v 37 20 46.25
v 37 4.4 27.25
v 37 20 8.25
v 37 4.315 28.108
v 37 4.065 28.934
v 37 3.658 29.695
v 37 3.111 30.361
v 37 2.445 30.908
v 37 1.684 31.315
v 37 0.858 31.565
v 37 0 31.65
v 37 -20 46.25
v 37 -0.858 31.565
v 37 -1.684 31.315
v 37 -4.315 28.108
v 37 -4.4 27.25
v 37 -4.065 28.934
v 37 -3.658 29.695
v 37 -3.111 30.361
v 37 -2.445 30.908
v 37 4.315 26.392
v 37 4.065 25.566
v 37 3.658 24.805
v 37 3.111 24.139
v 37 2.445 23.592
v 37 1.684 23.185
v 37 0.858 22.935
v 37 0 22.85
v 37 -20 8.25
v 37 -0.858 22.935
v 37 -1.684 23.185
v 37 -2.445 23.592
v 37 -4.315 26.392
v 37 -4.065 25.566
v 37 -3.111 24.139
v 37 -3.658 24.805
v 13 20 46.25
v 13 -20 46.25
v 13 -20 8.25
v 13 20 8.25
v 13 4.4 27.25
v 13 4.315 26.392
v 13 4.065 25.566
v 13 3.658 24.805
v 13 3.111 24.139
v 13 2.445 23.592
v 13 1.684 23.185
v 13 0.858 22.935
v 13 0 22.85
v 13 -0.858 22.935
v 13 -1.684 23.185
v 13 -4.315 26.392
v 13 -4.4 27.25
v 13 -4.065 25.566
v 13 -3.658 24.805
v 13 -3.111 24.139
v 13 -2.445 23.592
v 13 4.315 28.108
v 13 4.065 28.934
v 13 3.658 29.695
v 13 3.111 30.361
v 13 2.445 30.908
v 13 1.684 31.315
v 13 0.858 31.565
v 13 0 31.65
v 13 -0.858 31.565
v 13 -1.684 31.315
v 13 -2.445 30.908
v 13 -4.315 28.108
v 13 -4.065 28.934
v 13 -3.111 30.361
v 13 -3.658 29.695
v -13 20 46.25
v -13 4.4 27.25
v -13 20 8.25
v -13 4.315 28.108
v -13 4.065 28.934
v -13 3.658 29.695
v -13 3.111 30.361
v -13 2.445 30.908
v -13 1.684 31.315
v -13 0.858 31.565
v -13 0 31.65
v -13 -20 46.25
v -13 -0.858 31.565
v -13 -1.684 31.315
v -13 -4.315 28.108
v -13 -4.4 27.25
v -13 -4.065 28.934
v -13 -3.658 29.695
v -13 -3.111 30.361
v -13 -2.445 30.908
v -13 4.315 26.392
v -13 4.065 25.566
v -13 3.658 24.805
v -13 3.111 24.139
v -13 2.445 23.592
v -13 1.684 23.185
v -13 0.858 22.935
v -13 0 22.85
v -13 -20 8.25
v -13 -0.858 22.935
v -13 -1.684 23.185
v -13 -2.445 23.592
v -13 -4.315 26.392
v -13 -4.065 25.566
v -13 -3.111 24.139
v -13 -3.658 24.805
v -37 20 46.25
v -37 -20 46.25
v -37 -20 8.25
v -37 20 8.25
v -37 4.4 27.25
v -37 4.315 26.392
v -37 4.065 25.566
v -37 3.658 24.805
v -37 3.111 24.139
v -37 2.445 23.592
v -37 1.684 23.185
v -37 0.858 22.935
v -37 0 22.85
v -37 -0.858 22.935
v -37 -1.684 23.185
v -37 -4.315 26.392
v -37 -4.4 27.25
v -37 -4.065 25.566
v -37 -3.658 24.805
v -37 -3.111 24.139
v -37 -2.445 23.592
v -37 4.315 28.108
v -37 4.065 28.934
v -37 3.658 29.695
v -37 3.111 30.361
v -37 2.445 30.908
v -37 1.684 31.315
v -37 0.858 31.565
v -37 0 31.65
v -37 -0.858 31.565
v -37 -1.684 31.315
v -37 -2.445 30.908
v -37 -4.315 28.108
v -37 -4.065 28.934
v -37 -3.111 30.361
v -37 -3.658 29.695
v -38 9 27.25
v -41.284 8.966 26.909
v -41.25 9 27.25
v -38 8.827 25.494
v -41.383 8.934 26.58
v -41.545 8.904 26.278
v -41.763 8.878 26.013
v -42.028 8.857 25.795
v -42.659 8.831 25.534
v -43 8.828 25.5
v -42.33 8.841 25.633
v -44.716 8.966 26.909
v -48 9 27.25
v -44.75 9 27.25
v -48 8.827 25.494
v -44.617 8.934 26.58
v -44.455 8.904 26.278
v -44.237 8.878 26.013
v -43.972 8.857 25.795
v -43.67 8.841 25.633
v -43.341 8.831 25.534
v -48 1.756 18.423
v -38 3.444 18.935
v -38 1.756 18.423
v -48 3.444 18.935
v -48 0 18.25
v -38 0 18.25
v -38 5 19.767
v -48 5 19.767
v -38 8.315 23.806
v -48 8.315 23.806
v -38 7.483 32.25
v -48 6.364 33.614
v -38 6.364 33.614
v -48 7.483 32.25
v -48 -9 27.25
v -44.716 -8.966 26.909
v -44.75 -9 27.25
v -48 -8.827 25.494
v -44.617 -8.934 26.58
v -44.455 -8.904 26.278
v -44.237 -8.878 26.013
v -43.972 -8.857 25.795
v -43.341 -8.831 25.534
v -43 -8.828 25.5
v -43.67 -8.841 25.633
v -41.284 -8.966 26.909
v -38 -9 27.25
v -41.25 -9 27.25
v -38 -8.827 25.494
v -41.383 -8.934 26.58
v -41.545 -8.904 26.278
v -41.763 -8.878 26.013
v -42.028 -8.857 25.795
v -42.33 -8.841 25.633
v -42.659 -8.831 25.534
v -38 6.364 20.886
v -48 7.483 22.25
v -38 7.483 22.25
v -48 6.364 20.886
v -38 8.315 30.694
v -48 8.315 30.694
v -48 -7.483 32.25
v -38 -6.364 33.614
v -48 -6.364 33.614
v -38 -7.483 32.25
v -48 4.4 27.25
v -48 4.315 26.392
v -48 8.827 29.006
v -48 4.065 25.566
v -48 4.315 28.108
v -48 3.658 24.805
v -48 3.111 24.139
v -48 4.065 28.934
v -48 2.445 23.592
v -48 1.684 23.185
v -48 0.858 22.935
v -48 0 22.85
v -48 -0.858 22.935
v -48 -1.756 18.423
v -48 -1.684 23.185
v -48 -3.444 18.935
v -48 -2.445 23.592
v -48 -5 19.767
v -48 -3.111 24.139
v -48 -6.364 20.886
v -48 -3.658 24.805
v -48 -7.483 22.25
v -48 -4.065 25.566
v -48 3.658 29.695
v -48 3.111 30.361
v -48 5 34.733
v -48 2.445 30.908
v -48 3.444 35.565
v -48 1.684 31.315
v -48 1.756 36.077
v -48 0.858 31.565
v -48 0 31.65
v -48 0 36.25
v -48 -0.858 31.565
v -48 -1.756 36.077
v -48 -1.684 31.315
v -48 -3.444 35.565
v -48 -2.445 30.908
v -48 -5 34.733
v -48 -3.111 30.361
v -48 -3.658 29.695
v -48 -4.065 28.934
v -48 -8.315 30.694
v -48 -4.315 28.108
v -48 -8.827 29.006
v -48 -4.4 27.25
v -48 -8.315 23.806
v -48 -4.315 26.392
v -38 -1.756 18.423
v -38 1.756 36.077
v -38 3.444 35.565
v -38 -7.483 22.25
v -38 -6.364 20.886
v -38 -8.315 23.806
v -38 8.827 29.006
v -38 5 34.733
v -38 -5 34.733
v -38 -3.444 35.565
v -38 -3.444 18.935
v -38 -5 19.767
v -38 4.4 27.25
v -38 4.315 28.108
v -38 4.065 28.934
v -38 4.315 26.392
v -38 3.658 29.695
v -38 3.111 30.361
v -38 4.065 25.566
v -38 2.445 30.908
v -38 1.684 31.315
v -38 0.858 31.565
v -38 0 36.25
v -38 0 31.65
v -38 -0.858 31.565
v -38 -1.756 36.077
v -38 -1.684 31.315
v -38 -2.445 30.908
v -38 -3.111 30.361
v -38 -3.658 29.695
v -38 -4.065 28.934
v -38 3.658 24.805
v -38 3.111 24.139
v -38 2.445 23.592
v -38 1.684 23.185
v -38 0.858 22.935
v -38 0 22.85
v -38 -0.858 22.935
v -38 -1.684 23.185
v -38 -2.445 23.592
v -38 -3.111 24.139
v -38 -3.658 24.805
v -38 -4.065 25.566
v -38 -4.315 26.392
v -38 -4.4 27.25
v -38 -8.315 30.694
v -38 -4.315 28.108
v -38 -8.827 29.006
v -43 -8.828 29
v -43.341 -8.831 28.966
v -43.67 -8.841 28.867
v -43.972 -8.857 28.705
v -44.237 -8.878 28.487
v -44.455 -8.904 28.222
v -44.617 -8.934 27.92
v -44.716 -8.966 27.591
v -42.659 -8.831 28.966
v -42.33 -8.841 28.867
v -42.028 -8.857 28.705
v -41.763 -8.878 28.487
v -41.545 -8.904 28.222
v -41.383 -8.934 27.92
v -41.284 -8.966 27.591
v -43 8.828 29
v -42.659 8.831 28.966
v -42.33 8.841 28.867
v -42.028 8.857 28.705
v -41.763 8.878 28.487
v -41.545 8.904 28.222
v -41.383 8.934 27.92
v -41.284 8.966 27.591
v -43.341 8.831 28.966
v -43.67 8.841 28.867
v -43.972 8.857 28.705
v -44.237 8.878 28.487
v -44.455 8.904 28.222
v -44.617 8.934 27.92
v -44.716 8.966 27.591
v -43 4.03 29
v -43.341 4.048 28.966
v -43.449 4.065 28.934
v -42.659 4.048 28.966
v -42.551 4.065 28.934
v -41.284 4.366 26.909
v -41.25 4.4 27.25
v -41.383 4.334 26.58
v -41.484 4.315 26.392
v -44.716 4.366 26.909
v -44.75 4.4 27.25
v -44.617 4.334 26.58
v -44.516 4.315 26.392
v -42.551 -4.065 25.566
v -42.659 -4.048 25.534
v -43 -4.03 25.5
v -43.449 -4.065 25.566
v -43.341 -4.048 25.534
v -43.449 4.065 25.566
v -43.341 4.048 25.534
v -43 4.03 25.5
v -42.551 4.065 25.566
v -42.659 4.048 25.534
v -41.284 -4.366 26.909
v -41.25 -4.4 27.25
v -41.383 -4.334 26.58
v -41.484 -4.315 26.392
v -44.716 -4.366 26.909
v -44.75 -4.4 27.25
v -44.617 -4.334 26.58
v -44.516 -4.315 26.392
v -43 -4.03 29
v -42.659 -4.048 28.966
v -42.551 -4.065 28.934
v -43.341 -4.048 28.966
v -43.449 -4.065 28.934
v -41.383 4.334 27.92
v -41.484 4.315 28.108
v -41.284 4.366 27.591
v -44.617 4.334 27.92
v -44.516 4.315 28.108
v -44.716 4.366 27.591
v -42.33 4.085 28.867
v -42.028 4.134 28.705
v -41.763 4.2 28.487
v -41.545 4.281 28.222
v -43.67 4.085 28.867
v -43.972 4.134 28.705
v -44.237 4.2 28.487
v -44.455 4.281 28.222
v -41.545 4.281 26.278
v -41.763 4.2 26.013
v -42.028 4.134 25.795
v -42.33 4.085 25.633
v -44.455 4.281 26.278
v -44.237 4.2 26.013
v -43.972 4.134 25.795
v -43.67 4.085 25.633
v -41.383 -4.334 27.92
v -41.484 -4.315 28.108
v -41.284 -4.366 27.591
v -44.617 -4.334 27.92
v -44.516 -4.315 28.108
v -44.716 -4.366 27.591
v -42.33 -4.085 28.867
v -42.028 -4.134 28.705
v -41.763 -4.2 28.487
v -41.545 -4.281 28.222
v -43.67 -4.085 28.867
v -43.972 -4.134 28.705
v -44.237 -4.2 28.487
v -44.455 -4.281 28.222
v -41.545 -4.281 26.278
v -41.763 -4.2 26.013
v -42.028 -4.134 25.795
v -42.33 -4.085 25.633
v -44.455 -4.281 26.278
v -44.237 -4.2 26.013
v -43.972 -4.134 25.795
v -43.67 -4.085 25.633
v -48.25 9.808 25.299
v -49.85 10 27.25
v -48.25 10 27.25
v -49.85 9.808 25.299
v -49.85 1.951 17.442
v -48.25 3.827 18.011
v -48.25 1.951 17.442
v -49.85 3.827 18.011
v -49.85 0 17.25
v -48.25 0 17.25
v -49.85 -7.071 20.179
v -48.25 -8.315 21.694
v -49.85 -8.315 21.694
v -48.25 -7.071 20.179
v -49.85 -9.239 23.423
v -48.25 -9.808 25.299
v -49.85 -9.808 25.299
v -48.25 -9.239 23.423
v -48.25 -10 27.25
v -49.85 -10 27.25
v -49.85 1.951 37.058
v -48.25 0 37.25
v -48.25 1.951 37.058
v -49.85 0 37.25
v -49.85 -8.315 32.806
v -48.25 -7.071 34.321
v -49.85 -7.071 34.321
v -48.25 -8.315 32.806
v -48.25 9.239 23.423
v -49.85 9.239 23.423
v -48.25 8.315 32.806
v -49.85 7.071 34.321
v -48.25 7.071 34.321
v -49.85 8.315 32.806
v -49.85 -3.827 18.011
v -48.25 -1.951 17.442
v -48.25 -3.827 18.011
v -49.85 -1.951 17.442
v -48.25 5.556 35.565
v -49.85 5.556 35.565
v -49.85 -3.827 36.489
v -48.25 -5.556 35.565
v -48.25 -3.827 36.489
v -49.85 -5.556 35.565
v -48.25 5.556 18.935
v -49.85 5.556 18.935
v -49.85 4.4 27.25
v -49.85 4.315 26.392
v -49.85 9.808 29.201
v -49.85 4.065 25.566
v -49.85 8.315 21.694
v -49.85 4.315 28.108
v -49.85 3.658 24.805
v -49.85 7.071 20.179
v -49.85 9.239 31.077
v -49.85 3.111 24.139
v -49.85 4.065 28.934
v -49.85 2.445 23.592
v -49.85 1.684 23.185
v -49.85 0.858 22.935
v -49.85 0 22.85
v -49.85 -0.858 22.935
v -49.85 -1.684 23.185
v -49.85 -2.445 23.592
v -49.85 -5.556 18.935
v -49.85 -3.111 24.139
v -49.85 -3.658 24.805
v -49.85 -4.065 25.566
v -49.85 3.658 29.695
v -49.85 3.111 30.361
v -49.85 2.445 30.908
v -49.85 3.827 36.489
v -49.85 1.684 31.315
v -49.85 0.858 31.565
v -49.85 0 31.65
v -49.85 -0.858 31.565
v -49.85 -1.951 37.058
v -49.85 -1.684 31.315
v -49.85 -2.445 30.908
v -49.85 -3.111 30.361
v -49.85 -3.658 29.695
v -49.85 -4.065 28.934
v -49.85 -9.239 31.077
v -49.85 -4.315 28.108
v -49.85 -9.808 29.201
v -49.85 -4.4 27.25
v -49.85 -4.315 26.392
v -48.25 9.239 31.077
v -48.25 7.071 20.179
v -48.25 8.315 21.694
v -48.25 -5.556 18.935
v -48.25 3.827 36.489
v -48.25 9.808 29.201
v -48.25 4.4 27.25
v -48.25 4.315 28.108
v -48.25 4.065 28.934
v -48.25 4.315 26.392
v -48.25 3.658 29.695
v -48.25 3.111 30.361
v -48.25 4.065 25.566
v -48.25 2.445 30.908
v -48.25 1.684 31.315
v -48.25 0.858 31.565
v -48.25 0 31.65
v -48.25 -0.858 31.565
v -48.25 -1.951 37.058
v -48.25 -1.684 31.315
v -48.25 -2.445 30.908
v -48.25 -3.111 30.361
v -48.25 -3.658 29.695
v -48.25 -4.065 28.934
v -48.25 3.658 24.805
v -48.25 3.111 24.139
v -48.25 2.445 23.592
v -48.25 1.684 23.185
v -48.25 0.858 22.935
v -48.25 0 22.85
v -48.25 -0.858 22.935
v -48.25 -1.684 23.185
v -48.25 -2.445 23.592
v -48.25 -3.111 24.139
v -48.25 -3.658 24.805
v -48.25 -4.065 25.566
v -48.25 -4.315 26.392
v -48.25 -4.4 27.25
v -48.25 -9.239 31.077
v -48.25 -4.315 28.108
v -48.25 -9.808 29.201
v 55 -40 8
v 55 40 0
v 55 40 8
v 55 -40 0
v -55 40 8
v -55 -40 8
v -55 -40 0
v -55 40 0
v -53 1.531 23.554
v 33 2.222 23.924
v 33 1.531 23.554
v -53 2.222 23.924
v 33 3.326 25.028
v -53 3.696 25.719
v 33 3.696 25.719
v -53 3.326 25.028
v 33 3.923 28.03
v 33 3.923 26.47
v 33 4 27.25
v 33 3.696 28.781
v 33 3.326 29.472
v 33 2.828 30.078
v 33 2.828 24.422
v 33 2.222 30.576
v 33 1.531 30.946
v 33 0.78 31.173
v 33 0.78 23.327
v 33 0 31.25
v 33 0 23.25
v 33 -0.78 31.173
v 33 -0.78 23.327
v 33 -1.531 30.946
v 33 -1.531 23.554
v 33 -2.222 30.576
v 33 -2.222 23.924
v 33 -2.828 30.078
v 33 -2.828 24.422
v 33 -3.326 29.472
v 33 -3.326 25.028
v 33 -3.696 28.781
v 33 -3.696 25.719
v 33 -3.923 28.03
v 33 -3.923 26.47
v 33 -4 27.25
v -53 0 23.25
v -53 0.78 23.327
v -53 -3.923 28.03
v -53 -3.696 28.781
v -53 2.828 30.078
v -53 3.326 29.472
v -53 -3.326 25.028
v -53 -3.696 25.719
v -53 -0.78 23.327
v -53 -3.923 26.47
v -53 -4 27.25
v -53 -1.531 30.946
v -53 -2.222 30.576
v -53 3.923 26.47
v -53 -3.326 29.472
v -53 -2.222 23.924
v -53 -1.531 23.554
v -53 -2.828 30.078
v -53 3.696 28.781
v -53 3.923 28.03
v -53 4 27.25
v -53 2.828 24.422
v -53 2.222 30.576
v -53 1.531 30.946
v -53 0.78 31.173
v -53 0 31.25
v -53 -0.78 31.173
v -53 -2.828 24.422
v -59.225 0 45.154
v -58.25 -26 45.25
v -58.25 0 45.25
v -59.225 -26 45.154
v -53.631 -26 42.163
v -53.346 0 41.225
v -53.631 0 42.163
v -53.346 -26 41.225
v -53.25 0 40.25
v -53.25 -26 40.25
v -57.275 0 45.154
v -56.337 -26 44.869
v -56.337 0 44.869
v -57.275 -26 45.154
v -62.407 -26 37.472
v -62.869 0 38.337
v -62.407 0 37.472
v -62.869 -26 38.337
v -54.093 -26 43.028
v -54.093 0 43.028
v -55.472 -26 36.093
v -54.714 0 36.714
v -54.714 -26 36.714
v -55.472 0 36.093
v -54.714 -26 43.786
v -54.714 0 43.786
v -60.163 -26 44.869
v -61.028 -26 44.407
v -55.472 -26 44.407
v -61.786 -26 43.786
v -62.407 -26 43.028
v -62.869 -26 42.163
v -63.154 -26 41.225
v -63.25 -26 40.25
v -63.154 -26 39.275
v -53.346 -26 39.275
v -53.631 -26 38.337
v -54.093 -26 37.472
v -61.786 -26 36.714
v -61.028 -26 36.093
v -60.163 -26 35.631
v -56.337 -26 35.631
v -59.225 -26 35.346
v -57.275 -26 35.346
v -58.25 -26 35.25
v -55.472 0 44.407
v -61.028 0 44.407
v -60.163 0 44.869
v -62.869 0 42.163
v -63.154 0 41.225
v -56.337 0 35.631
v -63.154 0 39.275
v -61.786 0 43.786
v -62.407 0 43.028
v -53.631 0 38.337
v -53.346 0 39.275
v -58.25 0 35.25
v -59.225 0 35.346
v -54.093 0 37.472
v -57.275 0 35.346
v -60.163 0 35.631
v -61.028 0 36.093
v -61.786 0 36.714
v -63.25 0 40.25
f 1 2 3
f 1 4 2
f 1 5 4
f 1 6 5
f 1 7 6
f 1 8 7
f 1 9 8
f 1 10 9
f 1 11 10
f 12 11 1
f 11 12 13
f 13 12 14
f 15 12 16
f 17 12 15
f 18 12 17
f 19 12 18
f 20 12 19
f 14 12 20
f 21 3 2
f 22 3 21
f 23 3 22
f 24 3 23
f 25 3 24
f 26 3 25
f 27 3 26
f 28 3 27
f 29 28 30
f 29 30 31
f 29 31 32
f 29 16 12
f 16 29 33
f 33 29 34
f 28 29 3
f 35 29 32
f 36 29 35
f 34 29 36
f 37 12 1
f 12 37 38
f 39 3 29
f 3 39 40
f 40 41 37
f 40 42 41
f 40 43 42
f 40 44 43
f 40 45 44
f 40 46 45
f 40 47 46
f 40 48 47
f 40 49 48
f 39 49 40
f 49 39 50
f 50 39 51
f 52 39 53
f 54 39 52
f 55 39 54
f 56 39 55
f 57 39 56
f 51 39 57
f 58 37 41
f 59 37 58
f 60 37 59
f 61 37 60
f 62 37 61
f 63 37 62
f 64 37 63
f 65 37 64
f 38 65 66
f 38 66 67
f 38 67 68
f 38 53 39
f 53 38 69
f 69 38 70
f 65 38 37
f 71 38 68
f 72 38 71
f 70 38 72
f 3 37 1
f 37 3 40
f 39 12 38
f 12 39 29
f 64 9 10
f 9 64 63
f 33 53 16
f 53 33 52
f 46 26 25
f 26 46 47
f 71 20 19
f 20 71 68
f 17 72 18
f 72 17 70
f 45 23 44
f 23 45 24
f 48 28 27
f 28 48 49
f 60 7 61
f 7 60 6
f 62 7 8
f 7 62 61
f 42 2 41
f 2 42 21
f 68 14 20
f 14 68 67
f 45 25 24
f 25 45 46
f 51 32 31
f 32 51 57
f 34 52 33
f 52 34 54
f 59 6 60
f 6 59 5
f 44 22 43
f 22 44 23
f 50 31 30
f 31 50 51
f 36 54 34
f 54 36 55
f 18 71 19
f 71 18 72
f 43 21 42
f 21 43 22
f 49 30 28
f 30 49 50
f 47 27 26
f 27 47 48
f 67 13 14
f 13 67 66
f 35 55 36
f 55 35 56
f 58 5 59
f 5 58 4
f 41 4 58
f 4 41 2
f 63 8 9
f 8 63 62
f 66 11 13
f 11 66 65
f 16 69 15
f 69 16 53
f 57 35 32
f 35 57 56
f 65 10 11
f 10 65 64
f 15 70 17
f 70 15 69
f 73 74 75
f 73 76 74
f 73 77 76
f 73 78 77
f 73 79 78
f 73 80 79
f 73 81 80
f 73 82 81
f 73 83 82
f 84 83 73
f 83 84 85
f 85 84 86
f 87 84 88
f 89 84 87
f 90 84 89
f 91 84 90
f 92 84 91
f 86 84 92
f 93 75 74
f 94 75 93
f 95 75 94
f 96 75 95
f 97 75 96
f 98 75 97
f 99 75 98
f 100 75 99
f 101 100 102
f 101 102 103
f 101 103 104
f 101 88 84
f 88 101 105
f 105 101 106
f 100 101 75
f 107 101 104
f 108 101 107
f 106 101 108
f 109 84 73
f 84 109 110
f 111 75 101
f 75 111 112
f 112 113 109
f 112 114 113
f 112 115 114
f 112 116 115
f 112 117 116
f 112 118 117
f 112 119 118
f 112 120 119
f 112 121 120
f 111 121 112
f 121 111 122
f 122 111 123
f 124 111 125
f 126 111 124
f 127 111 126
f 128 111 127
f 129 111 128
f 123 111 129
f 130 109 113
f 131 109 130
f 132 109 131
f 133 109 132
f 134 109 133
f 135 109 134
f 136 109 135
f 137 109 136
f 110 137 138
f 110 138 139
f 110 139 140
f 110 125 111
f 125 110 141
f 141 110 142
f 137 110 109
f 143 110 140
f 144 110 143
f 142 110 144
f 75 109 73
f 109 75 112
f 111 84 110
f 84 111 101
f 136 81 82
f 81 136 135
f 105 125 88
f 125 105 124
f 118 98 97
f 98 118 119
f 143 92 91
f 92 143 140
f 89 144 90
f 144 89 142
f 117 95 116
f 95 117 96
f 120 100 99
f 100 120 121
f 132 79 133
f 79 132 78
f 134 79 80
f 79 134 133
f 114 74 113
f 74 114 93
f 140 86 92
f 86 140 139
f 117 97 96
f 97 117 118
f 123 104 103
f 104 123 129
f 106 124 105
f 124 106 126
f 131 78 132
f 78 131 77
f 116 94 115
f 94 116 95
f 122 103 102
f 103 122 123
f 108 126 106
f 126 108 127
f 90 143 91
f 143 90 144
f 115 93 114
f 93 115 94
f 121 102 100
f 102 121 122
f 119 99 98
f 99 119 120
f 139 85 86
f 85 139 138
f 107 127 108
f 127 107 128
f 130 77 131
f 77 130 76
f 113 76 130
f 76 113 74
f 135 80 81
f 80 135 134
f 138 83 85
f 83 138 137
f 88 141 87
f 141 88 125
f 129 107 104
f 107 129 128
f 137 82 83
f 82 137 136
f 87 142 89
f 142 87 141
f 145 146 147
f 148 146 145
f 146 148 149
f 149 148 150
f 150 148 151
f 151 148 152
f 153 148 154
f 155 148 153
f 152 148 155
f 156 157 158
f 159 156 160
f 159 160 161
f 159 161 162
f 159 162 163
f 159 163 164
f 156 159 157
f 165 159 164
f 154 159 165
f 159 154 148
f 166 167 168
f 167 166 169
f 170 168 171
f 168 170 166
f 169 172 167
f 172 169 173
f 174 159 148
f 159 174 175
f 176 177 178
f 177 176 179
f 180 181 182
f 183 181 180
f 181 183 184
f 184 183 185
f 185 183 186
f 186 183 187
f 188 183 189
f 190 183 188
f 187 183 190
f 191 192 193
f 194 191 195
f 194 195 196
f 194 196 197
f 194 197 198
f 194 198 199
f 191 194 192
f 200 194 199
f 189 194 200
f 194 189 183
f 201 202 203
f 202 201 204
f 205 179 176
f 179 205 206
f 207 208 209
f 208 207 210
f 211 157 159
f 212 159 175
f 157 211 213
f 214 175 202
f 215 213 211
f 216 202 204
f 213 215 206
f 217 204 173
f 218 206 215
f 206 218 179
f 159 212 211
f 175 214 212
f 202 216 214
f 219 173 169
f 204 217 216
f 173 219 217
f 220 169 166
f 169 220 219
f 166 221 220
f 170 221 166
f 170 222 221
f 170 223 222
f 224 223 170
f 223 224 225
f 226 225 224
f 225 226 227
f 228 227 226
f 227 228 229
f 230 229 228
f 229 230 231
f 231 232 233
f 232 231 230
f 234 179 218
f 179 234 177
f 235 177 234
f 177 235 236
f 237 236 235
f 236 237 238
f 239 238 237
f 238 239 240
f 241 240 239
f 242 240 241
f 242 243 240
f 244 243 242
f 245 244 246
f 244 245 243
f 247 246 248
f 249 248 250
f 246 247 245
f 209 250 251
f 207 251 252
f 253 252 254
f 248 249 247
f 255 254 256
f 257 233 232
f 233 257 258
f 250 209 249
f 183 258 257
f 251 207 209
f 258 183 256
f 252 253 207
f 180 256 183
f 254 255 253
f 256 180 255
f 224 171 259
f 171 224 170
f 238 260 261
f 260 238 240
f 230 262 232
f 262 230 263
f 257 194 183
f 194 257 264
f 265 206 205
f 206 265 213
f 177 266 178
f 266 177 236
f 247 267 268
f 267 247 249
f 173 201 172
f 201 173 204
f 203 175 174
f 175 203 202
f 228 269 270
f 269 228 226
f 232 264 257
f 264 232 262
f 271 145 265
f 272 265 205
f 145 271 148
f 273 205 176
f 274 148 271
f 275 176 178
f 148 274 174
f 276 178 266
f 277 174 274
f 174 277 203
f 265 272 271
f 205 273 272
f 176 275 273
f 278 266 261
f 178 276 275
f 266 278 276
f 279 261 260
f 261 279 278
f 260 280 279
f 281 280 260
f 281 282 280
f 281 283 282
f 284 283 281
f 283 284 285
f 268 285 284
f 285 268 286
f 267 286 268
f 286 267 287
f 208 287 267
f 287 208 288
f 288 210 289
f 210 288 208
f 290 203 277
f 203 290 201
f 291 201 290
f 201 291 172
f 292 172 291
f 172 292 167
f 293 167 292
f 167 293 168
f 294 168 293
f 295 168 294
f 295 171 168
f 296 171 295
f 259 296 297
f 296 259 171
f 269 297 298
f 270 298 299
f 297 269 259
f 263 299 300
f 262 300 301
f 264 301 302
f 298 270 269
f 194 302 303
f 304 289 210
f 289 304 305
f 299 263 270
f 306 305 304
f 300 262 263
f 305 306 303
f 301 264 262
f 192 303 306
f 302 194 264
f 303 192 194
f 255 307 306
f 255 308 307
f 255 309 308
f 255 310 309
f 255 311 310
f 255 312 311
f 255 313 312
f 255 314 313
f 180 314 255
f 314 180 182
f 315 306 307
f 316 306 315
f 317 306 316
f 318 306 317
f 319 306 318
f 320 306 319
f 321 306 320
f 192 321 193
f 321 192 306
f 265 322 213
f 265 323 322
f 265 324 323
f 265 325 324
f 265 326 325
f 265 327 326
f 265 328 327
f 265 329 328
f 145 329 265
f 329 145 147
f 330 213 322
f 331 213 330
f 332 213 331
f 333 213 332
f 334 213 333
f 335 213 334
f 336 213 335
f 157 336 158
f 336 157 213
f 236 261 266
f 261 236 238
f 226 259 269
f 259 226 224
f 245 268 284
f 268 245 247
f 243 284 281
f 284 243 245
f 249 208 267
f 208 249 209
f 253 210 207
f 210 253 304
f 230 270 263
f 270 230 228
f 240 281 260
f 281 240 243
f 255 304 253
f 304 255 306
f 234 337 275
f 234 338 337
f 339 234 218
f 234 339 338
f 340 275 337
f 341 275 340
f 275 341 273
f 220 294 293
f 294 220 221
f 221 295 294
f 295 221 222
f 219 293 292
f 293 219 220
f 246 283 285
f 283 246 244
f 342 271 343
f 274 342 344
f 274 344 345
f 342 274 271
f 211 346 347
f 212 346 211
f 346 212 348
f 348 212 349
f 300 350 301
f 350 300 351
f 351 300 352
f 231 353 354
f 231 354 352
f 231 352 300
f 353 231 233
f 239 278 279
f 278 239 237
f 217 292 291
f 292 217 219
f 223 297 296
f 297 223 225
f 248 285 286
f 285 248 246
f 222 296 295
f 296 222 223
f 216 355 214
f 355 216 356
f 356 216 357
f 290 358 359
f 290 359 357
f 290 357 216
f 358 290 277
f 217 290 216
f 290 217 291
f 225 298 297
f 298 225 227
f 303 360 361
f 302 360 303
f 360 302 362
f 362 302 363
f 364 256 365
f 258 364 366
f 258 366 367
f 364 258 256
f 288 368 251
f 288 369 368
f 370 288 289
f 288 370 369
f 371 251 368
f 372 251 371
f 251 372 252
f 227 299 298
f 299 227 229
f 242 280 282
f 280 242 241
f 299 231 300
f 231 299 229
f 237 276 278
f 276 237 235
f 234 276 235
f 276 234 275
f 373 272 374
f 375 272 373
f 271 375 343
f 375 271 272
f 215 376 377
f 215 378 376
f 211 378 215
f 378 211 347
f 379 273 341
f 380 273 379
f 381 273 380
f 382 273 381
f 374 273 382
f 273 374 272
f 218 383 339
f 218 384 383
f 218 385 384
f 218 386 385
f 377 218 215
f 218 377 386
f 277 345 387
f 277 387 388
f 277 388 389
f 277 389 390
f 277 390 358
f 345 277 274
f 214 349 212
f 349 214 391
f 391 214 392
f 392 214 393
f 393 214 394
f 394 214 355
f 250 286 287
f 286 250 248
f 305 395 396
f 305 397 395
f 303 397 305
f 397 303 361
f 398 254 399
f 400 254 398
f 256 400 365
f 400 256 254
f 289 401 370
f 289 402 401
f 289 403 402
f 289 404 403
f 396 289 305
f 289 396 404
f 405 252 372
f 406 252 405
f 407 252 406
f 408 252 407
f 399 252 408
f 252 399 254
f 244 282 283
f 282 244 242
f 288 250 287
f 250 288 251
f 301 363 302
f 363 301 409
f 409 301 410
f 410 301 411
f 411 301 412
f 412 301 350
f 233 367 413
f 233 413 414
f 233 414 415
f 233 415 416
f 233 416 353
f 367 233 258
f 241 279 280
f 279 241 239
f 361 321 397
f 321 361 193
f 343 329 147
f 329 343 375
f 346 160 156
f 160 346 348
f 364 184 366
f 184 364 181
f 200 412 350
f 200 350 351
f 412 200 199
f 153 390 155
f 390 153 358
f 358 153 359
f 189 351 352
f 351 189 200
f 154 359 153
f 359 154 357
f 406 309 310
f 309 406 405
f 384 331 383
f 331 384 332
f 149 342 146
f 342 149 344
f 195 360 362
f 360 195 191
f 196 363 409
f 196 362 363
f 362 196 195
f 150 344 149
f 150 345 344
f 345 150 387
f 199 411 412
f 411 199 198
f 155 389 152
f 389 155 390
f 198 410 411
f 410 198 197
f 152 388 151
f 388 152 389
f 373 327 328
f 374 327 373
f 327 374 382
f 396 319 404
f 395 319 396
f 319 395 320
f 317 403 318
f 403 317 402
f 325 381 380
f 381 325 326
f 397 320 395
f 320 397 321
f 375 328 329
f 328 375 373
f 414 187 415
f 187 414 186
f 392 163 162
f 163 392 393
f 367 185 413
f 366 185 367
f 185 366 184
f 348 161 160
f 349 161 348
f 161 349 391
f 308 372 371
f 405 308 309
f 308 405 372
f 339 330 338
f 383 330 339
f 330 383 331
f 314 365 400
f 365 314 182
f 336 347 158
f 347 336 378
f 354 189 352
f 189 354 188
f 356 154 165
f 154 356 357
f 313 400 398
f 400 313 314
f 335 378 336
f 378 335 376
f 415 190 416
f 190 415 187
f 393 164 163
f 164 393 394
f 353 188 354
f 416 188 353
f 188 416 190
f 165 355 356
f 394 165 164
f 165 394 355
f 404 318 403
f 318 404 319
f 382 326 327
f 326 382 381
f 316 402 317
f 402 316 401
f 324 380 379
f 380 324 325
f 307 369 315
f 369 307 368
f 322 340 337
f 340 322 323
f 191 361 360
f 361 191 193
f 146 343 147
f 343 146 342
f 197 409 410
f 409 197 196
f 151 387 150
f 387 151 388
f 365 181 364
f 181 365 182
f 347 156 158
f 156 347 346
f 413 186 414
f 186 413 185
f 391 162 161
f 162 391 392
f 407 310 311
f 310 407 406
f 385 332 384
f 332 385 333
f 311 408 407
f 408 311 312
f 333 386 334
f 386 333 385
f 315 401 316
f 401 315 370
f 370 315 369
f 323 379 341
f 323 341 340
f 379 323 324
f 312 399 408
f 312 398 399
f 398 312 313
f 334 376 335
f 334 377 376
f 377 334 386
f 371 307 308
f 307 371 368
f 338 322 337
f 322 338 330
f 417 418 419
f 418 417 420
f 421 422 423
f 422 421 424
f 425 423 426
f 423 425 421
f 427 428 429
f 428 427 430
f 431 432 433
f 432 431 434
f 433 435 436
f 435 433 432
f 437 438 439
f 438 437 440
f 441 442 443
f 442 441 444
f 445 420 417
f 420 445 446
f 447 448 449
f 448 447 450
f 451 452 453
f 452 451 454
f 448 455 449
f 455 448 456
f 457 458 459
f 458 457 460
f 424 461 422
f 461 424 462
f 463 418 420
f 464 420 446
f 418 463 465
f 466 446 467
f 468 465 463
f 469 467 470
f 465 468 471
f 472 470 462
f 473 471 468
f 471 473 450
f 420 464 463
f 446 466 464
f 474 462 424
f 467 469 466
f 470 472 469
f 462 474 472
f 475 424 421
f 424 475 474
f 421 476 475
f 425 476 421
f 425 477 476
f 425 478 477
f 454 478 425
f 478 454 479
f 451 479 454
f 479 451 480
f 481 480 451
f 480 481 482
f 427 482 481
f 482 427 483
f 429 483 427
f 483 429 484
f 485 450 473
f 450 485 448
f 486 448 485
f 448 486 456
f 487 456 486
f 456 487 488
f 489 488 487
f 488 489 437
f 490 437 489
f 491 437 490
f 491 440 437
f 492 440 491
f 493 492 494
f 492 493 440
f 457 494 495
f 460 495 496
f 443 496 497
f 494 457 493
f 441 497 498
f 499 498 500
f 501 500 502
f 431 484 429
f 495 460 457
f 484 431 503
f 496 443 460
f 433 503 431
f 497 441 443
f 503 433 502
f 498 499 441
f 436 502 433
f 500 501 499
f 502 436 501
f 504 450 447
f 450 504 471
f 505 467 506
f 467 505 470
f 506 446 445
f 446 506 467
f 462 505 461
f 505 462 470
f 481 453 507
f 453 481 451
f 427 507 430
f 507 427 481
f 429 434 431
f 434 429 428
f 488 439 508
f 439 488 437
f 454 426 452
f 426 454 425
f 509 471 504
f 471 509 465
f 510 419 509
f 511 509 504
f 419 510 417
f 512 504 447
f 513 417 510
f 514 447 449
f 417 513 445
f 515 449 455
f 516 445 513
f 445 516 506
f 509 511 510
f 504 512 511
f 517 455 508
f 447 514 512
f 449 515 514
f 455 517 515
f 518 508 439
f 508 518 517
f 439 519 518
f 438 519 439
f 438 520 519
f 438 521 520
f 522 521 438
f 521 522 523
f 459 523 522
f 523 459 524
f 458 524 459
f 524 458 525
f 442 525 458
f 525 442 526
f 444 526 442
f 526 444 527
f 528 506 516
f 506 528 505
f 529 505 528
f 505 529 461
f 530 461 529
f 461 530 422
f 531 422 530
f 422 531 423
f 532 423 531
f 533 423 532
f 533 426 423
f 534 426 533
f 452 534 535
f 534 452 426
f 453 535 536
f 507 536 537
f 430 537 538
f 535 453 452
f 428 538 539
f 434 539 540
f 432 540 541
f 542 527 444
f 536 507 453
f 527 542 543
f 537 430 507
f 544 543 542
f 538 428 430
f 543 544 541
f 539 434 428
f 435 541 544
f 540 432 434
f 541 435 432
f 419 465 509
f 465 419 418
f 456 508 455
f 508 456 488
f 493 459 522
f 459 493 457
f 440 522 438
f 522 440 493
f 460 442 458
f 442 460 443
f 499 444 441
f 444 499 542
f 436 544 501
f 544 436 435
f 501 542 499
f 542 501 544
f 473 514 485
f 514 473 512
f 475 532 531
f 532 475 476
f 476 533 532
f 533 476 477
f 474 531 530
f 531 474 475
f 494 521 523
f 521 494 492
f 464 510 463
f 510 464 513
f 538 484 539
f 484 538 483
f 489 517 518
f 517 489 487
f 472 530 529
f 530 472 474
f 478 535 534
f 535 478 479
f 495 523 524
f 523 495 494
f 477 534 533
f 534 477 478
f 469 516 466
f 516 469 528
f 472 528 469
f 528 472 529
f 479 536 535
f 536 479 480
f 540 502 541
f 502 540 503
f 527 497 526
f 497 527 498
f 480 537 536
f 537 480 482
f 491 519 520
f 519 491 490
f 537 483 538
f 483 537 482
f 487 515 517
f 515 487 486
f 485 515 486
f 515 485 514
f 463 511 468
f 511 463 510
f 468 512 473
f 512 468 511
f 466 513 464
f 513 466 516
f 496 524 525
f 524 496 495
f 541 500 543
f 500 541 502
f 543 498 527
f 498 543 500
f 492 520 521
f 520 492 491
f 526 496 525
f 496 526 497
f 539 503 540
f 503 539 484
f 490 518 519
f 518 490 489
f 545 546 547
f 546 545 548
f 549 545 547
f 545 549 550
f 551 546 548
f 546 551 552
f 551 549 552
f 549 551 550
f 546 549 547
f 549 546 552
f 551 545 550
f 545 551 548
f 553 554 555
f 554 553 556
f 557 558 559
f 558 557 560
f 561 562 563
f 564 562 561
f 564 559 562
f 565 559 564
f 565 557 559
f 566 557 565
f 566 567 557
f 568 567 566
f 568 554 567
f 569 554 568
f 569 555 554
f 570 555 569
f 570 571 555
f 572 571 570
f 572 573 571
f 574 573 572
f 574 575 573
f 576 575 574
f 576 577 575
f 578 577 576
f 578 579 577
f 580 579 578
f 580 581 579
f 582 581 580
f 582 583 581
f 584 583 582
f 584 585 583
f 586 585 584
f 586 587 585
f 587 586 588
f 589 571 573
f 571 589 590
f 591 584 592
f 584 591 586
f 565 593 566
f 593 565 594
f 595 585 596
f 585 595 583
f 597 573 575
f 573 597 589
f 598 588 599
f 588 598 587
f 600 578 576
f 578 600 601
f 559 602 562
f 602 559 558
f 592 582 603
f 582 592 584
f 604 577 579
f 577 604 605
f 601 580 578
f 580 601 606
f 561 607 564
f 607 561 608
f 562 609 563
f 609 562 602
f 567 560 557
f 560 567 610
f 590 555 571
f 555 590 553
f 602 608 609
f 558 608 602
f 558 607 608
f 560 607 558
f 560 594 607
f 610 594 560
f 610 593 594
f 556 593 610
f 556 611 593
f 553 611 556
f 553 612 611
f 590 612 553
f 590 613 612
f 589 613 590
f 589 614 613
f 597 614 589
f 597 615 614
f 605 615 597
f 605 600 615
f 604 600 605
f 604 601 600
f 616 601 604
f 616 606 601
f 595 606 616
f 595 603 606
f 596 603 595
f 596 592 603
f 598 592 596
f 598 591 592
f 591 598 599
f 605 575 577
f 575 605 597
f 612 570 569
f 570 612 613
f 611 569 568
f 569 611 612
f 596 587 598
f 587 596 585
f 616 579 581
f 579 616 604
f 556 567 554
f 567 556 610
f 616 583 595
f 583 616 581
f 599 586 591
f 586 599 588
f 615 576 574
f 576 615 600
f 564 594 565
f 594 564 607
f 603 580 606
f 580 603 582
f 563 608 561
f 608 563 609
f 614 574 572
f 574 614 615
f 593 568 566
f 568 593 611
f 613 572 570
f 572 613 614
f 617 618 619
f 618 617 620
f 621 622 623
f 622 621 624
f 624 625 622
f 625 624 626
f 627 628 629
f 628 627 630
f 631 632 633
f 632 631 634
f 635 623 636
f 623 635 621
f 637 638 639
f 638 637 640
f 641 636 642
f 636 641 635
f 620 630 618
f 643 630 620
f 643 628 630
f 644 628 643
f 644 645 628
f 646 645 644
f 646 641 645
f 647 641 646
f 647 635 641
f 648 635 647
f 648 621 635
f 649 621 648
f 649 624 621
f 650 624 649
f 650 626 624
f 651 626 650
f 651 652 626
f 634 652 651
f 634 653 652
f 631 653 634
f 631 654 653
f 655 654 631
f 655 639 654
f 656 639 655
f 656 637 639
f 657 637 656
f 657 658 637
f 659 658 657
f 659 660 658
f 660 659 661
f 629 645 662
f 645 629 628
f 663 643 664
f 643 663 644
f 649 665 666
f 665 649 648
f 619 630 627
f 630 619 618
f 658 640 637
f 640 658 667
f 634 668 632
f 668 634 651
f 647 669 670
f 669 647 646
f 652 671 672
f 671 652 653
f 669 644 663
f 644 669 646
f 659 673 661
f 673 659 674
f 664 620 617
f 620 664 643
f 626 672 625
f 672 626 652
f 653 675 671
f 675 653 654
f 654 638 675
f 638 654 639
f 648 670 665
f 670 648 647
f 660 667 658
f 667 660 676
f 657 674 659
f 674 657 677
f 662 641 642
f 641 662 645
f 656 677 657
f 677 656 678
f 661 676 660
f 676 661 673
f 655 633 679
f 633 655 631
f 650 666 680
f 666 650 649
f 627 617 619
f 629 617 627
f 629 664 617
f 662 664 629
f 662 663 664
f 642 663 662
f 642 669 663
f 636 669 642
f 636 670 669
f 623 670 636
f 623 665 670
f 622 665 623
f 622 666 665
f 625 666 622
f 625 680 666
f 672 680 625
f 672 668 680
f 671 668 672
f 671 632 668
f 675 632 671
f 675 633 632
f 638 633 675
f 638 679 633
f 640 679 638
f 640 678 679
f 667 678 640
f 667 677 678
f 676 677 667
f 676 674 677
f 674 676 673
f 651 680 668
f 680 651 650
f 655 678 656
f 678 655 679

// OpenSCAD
$fn = 32;

// ------------------------------------------------------------------------
// Machine vise: screw d8, jaws 24 x 38 mm
// Every part is its own module, assembly() places every instance.
// ------------------------------------------------------------------------

// --- part 1 ---
module vise_bed() {
  difference() {
    translate([-55, -40, 0]) cube([110, 80, 8]);
  }
}

// --- part 2 ---
module vise_jaw() {
  difference() {
    translate([-12, -20, 0]) cube([24, 40, 38]);
    translate([0, 0, 19]) rotate([0, 90, 0]) cylinder(h = 26, d = 8.8, center = true);
  }
}

// --- part 3 ---
module vise_screw() {
  translate([0, 0, -43]) cylinder(h = 86, d = 8);
}

// --- part 4 ---
module screw_collar() {
  difference() {
    cylinder(h = 10, d = 18);
    translate([0, 0, -1]) cylinder(h = 12, d = 8.8);
    translate([0, 0, 5]) rotate([90, 0, 0]) cylinder(h = 20, d = 3.5, center = true);
  }
}

// --- part 5 ---
module screw_washer() {
  difference() {
      translate([0, 0, 0]) cylinder(h = 1.6, d = 20);
      translate([0, 0, -1]) cylinder(h = 3.6, d = 8.8);
    }
}

// --- part 6 ---
module vise_handle() {
  cylinder(h = 26, d = 10);
}

// --- assembly ---
module assembly() {
  color([0.80, 0.24, 0.20]) translate([0, 0, 0]) rotate([0, 0, 0]) vise_bed();
  color([0.20, 0.45, 0.75]) translate([25, 0, 8.25]) rotate([0, 0, 0]) vise_jaw();
  color([0.25, 0.62, 0.32]) translate([-25, 0, 8.25]) rotate([0, 0, 0]) vise_jaw();
  color([0.92, 0.70, 0.18]) translate([-10, 0, 27.25]) rotate([0, 90, 0]) vise_screw();
  color([0.58, 0.35, 0.70]) translate([-48, 0, 27.25]) rotate([0, 90, 0]) screw_collar();
  color([0.16, 0.66, 0.66]) translate([-49.85, 0, 27.25]) rotate([0, 90, 0]) screw_washer();
  color([0.85, 0.48, 0.18]) translate([-58.25, 0, 40.25]) rotate([90, 0, 0]) vise_handle();
}

assembly();
